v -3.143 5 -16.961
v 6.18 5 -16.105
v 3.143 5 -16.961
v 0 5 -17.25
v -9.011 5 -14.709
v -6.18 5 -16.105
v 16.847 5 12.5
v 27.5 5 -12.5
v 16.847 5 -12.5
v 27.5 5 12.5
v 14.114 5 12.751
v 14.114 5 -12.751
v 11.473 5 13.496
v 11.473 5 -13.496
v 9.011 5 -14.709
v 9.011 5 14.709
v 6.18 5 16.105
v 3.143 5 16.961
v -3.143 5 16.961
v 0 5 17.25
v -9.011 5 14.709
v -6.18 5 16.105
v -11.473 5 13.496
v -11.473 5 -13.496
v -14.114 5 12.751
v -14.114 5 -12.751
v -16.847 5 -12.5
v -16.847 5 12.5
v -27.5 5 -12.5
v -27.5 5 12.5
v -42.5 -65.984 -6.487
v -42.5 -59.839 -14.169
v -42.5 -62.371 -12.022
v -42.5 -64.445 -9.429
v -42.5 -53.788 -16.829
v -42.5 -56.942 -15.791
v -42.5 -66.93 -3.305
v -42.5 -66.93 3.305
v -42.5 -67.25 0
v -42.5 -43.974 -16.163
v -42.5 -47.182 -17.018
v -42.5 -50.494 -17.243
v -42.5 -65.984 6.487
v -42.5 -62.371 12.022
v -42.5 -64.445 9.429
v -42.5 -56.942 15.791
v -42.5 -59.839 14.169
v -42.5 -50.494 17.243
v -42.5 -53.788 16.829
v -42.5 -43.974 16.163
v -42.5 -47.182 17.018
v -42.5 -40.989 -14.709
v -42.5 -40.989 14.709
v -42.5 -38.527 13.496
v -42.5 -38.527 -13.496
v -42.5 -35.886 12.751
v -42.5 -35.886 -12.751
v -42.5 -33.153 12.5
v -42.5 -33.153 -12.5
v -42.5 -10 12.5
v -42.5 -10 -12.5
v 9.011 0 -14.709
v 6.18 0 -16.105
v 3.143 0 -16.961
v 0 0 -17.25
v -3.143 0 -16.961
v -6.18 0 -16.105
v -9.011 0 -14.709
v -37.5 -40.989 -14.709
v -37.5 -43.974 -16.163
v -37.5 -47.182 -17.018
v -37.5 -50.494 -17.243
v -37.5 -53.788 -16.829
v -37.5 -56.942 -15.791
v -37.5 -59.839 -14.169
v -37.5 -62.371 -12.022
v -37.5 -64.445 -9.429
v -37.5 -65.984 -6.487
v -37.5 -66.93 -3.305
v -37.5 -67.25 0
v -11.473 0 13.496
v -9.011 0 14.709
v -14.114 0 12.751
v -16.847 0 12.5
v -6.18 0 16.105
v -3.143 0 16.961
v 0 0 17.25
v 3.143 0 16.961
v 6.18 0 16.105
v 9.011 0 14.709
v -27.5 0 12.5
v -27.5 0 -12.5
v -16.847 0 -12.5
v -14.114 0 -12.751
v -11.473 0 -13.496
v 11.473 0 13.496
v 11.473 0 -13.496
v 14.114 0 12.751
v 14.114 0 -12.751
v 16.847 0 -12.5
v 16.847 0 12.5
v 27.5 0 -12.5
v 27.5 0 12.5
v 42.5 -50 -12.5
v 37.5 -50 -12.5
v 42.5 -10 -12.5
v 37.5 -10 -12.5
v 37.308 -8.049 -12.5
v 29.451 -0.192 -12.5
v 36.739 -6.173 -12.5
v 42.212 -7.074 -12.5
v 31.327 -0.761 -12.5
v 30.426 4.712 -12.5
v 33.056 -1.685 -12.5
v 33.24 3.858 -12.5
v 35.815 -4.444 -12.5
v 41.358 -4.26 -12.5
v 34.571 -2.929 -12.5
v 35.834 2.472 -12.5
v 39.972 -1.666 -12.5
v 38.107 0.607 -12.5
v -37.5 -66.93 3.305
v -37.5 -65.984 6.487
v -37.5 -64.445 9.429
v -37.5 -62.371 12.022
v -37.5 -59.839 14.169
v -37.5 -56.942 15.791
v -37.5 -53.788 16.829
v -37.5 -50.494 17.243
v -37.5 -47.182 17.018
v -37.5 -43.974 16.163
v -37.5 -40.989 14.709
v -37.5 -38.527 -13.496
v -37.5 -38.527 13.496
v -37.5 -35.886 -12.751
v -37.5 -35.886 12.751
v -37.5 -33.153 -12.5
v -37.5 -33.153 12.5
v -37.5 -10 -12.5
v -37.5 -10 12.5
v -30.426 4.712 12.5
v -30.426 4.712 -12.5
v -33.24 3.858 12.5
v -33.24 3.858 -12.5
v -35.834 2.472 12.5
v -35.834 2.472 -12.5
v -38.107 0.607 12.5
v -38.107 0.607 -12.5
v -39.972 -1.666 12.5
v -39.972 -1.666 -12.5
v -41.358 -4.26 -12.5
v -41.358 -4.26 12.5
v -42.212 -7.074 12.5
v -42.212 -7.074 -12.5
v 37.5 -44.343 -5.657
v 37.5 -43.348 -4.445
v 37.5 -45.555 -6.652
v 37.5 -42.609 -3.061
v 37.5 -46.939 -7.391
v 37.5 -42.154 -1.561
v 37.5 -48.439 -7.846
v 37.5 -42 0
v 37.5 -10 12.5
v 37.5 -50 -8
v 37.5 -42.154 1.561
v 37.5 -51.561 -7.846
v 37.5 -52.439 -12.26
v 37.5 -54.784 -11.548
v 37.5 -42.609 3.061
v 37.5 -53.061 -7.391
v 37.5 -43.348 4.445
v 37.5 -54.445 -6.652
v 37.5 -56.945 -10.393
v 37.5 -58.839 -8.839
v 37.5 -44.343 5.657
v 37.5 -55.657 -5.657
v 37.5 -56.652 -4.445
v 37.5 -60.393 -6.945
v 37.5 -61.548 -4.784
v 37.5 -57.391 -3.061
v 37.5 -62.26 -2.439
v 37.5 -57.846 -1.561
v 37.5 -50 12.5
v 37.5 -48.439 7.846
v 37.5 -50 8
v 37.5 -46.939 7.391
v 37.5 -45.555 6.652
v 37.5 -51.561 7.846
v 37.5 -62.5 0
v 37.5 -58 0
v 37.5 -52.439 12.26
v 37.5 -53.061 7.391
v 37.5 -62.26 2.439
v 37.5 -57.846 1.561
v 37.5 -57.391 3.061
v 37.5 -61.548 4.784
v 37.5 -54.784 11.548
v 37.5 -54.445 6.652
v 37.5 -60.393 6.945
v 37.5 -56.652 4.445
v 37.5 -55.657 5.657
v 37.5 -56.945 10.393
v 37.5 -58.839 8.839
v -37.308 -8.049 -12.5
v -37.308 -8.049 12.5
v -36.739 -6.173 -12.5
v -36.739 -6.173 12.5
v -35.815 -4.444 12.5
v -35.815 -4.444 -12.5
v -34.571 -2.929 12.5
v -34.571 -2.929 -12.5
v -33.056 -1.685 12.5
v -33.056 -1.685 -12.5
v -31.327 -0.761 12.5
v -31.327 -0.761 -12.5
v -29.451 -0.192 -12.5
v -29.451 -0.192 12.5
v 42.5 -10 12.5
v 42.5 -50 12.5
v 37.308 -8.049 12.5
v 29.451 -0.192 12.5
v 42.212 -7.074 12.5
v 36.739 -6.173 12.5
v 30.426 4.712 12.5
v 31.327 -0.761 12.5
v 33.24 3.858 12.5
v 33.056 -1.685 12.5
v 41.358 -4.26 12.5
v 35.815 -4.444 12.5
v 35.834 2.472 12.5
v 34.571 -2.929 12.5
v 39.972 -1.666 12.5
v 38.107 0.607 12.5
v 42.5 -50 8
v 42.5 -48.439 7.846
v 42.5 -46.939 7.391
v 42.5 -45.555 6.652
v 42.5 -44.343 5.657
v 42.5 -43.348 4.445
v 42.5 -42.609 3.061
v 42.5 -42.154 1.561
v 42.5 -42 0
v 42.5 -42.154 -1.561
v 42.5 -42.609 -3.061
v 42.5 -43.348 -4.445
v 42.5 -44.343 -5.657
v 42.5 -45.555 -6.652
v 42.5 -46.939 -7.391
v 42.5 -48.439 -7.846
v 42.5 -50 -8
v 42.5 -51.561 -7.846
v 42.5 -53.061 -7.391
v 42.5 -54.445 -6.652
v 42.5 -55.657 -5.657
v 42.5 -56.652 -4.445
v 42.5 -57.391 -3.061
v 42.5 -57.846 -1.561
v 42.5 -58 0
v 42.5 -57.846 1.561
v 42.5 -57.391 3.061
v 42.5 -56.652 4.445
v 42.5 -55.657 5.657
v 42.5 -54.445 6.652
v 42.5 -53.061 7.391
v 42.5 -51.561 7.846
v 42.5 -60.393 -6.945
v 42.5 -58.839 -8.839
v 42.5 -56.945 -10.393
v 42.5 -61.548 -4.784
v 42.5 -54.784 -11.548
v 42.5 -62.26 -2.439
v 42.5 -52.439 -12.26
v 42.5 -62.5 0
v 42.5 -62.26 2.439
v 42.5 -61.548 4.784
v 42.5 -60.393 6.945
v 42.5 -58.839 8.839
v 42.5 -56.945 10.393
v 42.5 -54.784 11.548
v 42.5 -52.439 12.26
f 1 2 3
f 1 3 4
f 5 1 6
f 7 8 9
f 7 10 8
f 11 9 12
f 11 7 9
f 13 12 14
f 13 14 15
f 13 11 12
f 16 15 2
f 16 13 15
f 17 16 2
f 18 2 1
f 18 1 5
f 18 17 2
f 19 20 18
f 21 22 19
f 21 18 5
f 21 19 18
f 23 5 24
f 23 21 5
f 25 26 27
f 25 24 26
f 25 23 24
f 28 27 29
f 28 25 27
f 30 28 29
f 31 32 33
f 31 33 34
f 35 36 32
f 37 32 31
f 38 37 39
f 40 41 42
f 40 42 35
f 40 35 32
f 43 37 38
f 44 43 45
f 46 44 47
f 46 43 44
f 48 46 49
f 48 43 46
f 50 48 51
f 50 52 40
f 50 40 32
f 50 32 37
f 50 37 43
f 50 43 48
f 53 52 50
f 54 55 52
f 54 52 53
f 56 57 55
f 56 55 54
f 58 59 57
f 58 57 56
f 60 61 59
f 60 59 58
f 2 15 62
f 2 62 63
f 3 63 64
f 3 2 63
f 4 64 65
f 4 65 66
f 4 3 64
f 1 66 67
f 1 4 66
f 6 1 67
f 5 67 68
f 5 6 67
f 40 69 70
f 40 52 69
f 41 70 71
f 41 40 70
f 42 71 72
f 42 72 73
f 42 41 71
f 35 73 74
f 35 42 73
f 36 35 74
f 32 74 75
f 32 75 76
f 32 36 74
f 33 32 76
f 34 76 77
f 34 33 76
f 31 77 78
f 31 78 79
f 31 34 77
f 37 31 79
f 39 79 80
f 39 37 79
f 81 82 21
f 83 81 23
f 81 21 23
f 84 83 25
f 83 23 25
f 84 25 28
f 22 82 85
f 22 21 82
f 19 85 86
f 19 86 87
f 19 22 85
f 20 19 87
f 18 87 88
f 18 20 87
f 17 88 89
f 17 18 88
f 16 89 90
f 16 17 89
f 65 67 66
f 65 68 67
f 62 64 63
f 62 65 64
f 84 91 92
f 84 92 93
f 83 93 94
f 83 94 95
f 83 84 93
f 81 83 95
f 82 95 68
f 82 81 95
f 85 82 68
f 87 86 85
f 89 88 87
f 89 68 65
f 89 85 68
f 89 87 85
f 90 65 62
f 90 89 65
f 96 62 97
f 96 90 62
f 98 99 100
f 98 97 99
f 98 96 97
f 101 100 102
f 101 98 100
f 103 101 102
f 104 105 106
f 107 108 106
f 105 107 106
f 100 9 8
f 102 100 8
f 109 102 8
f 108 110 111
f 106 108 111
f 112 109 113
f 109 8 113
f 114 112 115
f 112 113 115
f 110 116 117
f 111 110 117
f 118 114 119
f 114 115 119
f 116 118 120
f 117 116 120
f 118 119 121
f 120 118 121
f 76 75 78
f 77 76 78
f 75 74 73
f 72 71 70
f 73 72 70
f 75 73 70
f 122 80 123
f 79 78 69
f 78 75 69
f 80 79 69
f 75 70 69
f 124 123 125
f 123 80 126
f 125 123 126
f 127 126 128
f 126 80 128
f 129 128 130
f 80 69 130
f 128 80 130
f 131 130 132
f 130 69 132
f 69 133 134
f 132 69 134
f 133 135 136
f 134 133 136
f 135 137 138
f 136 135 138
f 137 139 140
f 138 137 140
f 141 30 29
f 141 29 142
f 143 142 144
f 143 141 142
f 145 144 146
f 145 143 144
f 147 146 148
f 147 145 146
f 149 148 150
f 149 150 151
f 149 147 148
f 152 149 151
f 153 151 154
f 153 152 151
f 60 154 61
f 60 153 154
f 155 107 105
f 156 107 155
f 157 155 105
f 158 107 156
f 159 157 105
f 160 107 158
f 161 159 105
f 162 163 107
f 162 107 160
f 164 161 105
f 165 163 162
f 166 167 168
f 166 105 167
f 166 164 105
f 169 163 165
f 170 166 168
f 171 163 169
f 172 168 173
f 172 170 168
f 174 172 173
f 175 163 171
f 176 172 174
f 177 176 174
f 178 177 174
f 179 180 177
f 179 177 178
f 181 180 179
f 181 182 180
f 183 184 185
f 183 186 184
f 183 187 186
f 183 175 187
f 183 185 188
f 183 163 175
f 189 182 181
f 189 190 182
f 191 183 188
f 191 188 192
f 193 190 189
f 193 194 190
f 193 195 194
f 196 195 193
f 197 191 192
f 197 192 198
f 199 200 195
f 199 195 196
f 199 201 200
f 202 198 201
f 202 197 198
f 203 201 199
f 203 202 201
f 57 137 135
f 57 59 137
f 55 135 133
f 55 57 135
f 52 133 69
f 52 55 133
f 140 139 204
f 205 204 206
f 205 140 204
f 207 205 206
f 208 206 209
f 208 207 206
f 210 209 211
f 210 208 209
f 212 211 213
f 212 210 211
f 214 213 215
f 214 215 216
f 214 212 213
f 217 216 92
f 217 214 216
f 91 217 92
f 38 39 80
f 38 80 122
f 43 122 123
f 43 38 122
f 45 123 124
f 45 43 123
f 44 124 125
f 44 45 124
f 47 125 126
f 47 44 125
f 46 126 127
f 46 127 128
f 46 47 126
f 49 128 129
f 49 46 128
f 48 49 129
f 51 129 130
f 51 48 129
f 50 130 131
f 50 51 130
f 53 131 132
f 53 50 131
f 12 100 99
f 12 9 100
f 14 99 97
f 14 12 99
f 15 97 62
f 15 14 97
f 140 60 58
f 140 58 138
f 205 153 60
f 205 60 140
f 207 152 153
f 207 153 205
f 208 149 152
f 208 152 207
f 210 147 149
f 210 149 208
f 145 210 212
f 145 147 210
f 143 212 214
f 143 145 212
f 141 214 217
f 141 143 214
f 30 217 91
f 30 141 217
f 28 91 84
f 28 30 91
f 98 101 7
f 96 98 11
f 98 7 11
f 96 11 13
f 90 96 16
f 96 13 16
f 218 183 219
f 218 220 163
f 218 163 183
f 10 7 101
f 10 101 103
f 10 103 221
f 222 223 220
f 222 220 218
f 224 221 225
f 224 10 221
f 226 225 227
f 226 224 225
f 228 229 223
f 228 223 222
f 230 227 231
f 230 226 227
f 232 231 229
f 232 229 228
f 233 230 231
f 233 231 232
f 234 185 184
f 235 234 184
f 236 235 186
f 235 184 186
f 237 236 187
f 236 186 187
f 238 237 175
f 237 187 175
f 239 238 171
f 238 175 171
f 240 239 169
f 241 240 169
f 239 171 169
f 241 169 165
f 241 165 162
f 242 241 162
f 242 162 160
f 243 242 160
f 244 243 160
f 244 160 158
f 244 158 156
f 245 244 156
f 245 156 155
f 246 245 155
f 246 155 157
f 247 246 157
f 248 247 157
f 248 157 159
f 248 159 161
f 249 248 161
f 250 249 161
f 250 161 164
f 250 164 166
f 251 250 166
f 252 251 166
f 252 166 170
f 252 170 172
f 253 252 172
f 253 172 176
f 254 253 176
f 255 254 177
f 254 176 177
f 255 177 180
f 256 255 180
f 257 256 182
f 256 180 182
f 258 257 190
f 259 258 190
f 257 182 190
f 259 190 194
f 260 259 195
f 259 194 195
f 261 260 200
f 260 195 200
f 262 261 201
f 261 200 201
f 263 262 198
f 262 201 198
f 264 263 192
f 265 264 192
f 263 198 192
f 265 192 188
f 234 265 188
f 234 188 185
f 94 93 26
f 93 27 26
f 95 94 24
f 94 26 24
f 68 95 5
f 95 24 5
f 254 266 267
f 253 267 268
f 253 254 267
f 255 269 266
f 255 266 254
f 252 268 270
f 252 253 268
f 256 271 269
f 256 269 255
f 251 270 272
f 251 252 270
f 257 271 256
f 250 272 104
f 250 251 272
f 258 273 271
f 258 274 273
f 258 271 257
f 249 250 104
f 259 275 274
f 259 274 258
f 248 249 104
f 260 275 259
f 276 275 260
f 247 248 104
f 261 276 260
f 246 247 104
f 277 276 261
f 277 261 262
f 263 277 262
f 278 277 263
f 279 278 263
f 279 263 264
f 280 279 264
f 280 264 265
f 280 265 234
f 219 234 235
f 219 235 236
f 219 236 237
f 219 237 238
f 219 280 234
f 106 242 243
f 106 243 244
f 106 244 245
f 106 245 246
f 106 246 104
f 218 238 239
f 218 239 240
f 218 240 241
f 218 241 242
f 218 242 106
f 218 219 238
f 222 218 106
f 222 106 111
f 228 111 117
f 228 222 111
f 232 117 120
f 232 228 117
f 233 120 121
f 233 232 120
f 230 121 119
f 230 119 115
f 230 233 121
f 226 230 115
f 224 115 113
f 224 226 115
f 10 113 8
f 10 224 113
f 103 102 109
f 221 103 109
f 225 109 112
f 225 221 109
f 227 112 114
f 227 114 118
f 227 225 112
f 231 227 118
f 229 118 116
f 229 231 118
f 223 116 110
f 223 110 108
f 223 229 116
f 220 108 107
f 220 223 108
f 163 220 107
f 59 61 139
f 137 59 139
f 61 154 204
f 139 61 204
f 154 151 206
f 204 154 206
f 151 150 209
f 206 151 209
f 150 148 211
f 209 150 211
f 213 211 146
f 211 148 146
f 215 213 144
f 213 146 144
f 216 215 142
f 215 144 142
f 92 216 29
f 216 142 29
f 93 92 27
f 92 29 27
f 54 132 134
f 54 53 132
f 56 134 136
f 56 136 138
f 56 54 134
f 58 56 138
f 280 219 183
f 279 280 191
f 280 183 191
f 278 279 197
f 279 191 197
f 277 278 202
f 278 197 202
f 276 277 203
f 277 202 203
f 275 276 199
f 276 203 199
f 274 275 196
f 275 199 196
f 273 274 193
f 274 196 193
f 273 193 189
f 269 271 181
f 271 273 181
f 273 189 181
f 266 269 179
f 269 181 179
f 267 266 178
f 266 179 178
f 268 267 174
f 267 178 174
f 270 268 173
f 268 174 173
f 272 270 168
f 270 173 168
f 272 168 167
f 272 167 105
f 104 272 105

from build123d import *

# Parameters (mm, degrees)
BRACKET_U_SHAPE_DEPTH              = 12.5
SKETCH3_R                          = 17.25
MOTOR_RING_DEPTH                   = 5
MOTOR_RING_FILLETS_15MM_R          = 15
U_BRACKET_BOTTOM_ROUNDING_12_5MM_R = 12.5
SKETCH4_R                          = 17.25
TILT_MOTOR_TAB_DEPTH               = 5
TILT_MOTOR_TAB_FILLETS_15MM_R      = 15
SKETCH6_R                          = 8
BEARING_HOLE_CUT_DEPTH             = 106.925091456


with BuildPart() as part:
    # Sketch2 → Bracket U-shape (new, symmetric)
    with BuildSketch(Plane.XY):
        with BuildLine():
            Line((-37.5, -67.25), (-37.5, -10))
            ThreePointArc((-37.5, -10), (-34.571067812, -2.928932188), (-27.5, 0))
            Line((-27.5, 0), (27.5, 0))
            ThreePointArc((27.5, 0), (34.571067812, -2.928932188), (37.5, -10))
            Line((37.5, -10), (37.5, -67.25))
            Line((37.5, -67.25), (42.5, -67.25))
            Line((42.5, -67.25), (42.5, -10))
            ThreePointArc((42.5, -10), (38.106601718, 0.606601718), (27.5, 5))
            Line((27.5, 5), (-27.5, 5))
            ThreePointArc((-27.5, 5), (-38.106601718, 0.606601718), (-42.5, -10))
            Line((-42.5, -10), (-42.5, -67.25))
            Line((-42.5, -67.25), (-37.5, -67.25))
        make_face()
    extrude(amount=BRACKET_U_SHAPE_DEPTH, both=True)

    # Sketch3 → Motor ring (add)
    with BuildSketch(Plane(origin=(0, 5, 0), x_dir=(1, 0, 0), z_dir=(0, 1, 0))):
        Circle(SKETCH3_R)
    extrude(amount=-MOTOR_RING_DEPTH)

    # Motor ring fillets 15mm
    motor_ring_fillets_15mm_edges = [part.edges().sort_by_distance(p)[0] for p in [
        (11.887493428, 2.5, -12.5),
        (-11.887493428, 2.5, -12.5),
        (-11.887493428, 2.5, 12.5),
        (11.887493428, 2.5, 12.5),
    ]]
    fillet(motor_ring_fillets_15mm_edges, radius=MOTOR_RING_FILLETS_15MM_R)

    # U bracket bottom rounding 12.5mm
    u_bracket_bottom_rounding_12_5mm_edges = [part.edges().sort_by_distance(p)[0] for p in [
        (40, -67.25, 12.5),
        (40, -67.25, -12.5),
        (-40, -67.25, -12.5),
        (-40, -67.25, 12.5),
    ]]
    fillet(u_bracket_bottom_rounding_12_5mm_edges, radius=U_BRACKET_BOTTOM_ROUNDING_12_5MM_R - 0.0001)  # a hair under: the kernel refuses the full size

    # Sketch4 → Tilt motor tab (add)
    with BuildSketch(Plane.ZY.offset(42.5)):
        with Locations((0, -50)):
            Circle(SKETCH4_R)
    extrude(amount=-TILT_MOTOR_TAB_DEPTH)

    # Tilt motor tab fillets 15mm
    tilt_motor_tab_fillets_15mm_edges = [part.edges().sort_by_distance(p)[0] for p in [
        (-40, -38.112506572, 12.5),
        (-40, -38.112506572, -12.5),
    ]]
    fillet(tilt_motor_tab_fillets_15mm_edges, radius=TILT_MOTOR_TAB_FILLETS_15MM_R)

    # Sketch6 → Bearing hole cut (cut, through all)
    with BuildSketch(Plane.ZY.offset(-37.5)):
        with Locations((0, -50)):
            Circle(SKETCH6_R)
        with BuildLine():
            Line((12.5, -54.75), (12.5, -50))
            ThreePointArc((12.5, -50), (0, -62.5), (-12.5, -50))
            Line((-12.5, -50), (-12.5, -54.75))
            ThreePointArc((-12.5, -54.75), (-8.838834765, -63.588834765), (0, -67.25))
            ThreePointArc((0, -67.25), (8.838834765, -63.588834765), (12.5, -54.75))
        make_face()
    extrude(amount=-BEARING_HOLE_CUT_DEPTH, mode=Mode.SUBTRACT)


with BuildPart() as bearing_hole_cut_kept_piece:
    # of the separate pieces the step leaves, the one the design keeps (bearing_hole_cut_pieces_kept)
    add(part.part.solids().sort_by_distance((-37.5, -33.153264411, -12.5))[0])


solid = bearing_hole_cut_kept_piece.part
